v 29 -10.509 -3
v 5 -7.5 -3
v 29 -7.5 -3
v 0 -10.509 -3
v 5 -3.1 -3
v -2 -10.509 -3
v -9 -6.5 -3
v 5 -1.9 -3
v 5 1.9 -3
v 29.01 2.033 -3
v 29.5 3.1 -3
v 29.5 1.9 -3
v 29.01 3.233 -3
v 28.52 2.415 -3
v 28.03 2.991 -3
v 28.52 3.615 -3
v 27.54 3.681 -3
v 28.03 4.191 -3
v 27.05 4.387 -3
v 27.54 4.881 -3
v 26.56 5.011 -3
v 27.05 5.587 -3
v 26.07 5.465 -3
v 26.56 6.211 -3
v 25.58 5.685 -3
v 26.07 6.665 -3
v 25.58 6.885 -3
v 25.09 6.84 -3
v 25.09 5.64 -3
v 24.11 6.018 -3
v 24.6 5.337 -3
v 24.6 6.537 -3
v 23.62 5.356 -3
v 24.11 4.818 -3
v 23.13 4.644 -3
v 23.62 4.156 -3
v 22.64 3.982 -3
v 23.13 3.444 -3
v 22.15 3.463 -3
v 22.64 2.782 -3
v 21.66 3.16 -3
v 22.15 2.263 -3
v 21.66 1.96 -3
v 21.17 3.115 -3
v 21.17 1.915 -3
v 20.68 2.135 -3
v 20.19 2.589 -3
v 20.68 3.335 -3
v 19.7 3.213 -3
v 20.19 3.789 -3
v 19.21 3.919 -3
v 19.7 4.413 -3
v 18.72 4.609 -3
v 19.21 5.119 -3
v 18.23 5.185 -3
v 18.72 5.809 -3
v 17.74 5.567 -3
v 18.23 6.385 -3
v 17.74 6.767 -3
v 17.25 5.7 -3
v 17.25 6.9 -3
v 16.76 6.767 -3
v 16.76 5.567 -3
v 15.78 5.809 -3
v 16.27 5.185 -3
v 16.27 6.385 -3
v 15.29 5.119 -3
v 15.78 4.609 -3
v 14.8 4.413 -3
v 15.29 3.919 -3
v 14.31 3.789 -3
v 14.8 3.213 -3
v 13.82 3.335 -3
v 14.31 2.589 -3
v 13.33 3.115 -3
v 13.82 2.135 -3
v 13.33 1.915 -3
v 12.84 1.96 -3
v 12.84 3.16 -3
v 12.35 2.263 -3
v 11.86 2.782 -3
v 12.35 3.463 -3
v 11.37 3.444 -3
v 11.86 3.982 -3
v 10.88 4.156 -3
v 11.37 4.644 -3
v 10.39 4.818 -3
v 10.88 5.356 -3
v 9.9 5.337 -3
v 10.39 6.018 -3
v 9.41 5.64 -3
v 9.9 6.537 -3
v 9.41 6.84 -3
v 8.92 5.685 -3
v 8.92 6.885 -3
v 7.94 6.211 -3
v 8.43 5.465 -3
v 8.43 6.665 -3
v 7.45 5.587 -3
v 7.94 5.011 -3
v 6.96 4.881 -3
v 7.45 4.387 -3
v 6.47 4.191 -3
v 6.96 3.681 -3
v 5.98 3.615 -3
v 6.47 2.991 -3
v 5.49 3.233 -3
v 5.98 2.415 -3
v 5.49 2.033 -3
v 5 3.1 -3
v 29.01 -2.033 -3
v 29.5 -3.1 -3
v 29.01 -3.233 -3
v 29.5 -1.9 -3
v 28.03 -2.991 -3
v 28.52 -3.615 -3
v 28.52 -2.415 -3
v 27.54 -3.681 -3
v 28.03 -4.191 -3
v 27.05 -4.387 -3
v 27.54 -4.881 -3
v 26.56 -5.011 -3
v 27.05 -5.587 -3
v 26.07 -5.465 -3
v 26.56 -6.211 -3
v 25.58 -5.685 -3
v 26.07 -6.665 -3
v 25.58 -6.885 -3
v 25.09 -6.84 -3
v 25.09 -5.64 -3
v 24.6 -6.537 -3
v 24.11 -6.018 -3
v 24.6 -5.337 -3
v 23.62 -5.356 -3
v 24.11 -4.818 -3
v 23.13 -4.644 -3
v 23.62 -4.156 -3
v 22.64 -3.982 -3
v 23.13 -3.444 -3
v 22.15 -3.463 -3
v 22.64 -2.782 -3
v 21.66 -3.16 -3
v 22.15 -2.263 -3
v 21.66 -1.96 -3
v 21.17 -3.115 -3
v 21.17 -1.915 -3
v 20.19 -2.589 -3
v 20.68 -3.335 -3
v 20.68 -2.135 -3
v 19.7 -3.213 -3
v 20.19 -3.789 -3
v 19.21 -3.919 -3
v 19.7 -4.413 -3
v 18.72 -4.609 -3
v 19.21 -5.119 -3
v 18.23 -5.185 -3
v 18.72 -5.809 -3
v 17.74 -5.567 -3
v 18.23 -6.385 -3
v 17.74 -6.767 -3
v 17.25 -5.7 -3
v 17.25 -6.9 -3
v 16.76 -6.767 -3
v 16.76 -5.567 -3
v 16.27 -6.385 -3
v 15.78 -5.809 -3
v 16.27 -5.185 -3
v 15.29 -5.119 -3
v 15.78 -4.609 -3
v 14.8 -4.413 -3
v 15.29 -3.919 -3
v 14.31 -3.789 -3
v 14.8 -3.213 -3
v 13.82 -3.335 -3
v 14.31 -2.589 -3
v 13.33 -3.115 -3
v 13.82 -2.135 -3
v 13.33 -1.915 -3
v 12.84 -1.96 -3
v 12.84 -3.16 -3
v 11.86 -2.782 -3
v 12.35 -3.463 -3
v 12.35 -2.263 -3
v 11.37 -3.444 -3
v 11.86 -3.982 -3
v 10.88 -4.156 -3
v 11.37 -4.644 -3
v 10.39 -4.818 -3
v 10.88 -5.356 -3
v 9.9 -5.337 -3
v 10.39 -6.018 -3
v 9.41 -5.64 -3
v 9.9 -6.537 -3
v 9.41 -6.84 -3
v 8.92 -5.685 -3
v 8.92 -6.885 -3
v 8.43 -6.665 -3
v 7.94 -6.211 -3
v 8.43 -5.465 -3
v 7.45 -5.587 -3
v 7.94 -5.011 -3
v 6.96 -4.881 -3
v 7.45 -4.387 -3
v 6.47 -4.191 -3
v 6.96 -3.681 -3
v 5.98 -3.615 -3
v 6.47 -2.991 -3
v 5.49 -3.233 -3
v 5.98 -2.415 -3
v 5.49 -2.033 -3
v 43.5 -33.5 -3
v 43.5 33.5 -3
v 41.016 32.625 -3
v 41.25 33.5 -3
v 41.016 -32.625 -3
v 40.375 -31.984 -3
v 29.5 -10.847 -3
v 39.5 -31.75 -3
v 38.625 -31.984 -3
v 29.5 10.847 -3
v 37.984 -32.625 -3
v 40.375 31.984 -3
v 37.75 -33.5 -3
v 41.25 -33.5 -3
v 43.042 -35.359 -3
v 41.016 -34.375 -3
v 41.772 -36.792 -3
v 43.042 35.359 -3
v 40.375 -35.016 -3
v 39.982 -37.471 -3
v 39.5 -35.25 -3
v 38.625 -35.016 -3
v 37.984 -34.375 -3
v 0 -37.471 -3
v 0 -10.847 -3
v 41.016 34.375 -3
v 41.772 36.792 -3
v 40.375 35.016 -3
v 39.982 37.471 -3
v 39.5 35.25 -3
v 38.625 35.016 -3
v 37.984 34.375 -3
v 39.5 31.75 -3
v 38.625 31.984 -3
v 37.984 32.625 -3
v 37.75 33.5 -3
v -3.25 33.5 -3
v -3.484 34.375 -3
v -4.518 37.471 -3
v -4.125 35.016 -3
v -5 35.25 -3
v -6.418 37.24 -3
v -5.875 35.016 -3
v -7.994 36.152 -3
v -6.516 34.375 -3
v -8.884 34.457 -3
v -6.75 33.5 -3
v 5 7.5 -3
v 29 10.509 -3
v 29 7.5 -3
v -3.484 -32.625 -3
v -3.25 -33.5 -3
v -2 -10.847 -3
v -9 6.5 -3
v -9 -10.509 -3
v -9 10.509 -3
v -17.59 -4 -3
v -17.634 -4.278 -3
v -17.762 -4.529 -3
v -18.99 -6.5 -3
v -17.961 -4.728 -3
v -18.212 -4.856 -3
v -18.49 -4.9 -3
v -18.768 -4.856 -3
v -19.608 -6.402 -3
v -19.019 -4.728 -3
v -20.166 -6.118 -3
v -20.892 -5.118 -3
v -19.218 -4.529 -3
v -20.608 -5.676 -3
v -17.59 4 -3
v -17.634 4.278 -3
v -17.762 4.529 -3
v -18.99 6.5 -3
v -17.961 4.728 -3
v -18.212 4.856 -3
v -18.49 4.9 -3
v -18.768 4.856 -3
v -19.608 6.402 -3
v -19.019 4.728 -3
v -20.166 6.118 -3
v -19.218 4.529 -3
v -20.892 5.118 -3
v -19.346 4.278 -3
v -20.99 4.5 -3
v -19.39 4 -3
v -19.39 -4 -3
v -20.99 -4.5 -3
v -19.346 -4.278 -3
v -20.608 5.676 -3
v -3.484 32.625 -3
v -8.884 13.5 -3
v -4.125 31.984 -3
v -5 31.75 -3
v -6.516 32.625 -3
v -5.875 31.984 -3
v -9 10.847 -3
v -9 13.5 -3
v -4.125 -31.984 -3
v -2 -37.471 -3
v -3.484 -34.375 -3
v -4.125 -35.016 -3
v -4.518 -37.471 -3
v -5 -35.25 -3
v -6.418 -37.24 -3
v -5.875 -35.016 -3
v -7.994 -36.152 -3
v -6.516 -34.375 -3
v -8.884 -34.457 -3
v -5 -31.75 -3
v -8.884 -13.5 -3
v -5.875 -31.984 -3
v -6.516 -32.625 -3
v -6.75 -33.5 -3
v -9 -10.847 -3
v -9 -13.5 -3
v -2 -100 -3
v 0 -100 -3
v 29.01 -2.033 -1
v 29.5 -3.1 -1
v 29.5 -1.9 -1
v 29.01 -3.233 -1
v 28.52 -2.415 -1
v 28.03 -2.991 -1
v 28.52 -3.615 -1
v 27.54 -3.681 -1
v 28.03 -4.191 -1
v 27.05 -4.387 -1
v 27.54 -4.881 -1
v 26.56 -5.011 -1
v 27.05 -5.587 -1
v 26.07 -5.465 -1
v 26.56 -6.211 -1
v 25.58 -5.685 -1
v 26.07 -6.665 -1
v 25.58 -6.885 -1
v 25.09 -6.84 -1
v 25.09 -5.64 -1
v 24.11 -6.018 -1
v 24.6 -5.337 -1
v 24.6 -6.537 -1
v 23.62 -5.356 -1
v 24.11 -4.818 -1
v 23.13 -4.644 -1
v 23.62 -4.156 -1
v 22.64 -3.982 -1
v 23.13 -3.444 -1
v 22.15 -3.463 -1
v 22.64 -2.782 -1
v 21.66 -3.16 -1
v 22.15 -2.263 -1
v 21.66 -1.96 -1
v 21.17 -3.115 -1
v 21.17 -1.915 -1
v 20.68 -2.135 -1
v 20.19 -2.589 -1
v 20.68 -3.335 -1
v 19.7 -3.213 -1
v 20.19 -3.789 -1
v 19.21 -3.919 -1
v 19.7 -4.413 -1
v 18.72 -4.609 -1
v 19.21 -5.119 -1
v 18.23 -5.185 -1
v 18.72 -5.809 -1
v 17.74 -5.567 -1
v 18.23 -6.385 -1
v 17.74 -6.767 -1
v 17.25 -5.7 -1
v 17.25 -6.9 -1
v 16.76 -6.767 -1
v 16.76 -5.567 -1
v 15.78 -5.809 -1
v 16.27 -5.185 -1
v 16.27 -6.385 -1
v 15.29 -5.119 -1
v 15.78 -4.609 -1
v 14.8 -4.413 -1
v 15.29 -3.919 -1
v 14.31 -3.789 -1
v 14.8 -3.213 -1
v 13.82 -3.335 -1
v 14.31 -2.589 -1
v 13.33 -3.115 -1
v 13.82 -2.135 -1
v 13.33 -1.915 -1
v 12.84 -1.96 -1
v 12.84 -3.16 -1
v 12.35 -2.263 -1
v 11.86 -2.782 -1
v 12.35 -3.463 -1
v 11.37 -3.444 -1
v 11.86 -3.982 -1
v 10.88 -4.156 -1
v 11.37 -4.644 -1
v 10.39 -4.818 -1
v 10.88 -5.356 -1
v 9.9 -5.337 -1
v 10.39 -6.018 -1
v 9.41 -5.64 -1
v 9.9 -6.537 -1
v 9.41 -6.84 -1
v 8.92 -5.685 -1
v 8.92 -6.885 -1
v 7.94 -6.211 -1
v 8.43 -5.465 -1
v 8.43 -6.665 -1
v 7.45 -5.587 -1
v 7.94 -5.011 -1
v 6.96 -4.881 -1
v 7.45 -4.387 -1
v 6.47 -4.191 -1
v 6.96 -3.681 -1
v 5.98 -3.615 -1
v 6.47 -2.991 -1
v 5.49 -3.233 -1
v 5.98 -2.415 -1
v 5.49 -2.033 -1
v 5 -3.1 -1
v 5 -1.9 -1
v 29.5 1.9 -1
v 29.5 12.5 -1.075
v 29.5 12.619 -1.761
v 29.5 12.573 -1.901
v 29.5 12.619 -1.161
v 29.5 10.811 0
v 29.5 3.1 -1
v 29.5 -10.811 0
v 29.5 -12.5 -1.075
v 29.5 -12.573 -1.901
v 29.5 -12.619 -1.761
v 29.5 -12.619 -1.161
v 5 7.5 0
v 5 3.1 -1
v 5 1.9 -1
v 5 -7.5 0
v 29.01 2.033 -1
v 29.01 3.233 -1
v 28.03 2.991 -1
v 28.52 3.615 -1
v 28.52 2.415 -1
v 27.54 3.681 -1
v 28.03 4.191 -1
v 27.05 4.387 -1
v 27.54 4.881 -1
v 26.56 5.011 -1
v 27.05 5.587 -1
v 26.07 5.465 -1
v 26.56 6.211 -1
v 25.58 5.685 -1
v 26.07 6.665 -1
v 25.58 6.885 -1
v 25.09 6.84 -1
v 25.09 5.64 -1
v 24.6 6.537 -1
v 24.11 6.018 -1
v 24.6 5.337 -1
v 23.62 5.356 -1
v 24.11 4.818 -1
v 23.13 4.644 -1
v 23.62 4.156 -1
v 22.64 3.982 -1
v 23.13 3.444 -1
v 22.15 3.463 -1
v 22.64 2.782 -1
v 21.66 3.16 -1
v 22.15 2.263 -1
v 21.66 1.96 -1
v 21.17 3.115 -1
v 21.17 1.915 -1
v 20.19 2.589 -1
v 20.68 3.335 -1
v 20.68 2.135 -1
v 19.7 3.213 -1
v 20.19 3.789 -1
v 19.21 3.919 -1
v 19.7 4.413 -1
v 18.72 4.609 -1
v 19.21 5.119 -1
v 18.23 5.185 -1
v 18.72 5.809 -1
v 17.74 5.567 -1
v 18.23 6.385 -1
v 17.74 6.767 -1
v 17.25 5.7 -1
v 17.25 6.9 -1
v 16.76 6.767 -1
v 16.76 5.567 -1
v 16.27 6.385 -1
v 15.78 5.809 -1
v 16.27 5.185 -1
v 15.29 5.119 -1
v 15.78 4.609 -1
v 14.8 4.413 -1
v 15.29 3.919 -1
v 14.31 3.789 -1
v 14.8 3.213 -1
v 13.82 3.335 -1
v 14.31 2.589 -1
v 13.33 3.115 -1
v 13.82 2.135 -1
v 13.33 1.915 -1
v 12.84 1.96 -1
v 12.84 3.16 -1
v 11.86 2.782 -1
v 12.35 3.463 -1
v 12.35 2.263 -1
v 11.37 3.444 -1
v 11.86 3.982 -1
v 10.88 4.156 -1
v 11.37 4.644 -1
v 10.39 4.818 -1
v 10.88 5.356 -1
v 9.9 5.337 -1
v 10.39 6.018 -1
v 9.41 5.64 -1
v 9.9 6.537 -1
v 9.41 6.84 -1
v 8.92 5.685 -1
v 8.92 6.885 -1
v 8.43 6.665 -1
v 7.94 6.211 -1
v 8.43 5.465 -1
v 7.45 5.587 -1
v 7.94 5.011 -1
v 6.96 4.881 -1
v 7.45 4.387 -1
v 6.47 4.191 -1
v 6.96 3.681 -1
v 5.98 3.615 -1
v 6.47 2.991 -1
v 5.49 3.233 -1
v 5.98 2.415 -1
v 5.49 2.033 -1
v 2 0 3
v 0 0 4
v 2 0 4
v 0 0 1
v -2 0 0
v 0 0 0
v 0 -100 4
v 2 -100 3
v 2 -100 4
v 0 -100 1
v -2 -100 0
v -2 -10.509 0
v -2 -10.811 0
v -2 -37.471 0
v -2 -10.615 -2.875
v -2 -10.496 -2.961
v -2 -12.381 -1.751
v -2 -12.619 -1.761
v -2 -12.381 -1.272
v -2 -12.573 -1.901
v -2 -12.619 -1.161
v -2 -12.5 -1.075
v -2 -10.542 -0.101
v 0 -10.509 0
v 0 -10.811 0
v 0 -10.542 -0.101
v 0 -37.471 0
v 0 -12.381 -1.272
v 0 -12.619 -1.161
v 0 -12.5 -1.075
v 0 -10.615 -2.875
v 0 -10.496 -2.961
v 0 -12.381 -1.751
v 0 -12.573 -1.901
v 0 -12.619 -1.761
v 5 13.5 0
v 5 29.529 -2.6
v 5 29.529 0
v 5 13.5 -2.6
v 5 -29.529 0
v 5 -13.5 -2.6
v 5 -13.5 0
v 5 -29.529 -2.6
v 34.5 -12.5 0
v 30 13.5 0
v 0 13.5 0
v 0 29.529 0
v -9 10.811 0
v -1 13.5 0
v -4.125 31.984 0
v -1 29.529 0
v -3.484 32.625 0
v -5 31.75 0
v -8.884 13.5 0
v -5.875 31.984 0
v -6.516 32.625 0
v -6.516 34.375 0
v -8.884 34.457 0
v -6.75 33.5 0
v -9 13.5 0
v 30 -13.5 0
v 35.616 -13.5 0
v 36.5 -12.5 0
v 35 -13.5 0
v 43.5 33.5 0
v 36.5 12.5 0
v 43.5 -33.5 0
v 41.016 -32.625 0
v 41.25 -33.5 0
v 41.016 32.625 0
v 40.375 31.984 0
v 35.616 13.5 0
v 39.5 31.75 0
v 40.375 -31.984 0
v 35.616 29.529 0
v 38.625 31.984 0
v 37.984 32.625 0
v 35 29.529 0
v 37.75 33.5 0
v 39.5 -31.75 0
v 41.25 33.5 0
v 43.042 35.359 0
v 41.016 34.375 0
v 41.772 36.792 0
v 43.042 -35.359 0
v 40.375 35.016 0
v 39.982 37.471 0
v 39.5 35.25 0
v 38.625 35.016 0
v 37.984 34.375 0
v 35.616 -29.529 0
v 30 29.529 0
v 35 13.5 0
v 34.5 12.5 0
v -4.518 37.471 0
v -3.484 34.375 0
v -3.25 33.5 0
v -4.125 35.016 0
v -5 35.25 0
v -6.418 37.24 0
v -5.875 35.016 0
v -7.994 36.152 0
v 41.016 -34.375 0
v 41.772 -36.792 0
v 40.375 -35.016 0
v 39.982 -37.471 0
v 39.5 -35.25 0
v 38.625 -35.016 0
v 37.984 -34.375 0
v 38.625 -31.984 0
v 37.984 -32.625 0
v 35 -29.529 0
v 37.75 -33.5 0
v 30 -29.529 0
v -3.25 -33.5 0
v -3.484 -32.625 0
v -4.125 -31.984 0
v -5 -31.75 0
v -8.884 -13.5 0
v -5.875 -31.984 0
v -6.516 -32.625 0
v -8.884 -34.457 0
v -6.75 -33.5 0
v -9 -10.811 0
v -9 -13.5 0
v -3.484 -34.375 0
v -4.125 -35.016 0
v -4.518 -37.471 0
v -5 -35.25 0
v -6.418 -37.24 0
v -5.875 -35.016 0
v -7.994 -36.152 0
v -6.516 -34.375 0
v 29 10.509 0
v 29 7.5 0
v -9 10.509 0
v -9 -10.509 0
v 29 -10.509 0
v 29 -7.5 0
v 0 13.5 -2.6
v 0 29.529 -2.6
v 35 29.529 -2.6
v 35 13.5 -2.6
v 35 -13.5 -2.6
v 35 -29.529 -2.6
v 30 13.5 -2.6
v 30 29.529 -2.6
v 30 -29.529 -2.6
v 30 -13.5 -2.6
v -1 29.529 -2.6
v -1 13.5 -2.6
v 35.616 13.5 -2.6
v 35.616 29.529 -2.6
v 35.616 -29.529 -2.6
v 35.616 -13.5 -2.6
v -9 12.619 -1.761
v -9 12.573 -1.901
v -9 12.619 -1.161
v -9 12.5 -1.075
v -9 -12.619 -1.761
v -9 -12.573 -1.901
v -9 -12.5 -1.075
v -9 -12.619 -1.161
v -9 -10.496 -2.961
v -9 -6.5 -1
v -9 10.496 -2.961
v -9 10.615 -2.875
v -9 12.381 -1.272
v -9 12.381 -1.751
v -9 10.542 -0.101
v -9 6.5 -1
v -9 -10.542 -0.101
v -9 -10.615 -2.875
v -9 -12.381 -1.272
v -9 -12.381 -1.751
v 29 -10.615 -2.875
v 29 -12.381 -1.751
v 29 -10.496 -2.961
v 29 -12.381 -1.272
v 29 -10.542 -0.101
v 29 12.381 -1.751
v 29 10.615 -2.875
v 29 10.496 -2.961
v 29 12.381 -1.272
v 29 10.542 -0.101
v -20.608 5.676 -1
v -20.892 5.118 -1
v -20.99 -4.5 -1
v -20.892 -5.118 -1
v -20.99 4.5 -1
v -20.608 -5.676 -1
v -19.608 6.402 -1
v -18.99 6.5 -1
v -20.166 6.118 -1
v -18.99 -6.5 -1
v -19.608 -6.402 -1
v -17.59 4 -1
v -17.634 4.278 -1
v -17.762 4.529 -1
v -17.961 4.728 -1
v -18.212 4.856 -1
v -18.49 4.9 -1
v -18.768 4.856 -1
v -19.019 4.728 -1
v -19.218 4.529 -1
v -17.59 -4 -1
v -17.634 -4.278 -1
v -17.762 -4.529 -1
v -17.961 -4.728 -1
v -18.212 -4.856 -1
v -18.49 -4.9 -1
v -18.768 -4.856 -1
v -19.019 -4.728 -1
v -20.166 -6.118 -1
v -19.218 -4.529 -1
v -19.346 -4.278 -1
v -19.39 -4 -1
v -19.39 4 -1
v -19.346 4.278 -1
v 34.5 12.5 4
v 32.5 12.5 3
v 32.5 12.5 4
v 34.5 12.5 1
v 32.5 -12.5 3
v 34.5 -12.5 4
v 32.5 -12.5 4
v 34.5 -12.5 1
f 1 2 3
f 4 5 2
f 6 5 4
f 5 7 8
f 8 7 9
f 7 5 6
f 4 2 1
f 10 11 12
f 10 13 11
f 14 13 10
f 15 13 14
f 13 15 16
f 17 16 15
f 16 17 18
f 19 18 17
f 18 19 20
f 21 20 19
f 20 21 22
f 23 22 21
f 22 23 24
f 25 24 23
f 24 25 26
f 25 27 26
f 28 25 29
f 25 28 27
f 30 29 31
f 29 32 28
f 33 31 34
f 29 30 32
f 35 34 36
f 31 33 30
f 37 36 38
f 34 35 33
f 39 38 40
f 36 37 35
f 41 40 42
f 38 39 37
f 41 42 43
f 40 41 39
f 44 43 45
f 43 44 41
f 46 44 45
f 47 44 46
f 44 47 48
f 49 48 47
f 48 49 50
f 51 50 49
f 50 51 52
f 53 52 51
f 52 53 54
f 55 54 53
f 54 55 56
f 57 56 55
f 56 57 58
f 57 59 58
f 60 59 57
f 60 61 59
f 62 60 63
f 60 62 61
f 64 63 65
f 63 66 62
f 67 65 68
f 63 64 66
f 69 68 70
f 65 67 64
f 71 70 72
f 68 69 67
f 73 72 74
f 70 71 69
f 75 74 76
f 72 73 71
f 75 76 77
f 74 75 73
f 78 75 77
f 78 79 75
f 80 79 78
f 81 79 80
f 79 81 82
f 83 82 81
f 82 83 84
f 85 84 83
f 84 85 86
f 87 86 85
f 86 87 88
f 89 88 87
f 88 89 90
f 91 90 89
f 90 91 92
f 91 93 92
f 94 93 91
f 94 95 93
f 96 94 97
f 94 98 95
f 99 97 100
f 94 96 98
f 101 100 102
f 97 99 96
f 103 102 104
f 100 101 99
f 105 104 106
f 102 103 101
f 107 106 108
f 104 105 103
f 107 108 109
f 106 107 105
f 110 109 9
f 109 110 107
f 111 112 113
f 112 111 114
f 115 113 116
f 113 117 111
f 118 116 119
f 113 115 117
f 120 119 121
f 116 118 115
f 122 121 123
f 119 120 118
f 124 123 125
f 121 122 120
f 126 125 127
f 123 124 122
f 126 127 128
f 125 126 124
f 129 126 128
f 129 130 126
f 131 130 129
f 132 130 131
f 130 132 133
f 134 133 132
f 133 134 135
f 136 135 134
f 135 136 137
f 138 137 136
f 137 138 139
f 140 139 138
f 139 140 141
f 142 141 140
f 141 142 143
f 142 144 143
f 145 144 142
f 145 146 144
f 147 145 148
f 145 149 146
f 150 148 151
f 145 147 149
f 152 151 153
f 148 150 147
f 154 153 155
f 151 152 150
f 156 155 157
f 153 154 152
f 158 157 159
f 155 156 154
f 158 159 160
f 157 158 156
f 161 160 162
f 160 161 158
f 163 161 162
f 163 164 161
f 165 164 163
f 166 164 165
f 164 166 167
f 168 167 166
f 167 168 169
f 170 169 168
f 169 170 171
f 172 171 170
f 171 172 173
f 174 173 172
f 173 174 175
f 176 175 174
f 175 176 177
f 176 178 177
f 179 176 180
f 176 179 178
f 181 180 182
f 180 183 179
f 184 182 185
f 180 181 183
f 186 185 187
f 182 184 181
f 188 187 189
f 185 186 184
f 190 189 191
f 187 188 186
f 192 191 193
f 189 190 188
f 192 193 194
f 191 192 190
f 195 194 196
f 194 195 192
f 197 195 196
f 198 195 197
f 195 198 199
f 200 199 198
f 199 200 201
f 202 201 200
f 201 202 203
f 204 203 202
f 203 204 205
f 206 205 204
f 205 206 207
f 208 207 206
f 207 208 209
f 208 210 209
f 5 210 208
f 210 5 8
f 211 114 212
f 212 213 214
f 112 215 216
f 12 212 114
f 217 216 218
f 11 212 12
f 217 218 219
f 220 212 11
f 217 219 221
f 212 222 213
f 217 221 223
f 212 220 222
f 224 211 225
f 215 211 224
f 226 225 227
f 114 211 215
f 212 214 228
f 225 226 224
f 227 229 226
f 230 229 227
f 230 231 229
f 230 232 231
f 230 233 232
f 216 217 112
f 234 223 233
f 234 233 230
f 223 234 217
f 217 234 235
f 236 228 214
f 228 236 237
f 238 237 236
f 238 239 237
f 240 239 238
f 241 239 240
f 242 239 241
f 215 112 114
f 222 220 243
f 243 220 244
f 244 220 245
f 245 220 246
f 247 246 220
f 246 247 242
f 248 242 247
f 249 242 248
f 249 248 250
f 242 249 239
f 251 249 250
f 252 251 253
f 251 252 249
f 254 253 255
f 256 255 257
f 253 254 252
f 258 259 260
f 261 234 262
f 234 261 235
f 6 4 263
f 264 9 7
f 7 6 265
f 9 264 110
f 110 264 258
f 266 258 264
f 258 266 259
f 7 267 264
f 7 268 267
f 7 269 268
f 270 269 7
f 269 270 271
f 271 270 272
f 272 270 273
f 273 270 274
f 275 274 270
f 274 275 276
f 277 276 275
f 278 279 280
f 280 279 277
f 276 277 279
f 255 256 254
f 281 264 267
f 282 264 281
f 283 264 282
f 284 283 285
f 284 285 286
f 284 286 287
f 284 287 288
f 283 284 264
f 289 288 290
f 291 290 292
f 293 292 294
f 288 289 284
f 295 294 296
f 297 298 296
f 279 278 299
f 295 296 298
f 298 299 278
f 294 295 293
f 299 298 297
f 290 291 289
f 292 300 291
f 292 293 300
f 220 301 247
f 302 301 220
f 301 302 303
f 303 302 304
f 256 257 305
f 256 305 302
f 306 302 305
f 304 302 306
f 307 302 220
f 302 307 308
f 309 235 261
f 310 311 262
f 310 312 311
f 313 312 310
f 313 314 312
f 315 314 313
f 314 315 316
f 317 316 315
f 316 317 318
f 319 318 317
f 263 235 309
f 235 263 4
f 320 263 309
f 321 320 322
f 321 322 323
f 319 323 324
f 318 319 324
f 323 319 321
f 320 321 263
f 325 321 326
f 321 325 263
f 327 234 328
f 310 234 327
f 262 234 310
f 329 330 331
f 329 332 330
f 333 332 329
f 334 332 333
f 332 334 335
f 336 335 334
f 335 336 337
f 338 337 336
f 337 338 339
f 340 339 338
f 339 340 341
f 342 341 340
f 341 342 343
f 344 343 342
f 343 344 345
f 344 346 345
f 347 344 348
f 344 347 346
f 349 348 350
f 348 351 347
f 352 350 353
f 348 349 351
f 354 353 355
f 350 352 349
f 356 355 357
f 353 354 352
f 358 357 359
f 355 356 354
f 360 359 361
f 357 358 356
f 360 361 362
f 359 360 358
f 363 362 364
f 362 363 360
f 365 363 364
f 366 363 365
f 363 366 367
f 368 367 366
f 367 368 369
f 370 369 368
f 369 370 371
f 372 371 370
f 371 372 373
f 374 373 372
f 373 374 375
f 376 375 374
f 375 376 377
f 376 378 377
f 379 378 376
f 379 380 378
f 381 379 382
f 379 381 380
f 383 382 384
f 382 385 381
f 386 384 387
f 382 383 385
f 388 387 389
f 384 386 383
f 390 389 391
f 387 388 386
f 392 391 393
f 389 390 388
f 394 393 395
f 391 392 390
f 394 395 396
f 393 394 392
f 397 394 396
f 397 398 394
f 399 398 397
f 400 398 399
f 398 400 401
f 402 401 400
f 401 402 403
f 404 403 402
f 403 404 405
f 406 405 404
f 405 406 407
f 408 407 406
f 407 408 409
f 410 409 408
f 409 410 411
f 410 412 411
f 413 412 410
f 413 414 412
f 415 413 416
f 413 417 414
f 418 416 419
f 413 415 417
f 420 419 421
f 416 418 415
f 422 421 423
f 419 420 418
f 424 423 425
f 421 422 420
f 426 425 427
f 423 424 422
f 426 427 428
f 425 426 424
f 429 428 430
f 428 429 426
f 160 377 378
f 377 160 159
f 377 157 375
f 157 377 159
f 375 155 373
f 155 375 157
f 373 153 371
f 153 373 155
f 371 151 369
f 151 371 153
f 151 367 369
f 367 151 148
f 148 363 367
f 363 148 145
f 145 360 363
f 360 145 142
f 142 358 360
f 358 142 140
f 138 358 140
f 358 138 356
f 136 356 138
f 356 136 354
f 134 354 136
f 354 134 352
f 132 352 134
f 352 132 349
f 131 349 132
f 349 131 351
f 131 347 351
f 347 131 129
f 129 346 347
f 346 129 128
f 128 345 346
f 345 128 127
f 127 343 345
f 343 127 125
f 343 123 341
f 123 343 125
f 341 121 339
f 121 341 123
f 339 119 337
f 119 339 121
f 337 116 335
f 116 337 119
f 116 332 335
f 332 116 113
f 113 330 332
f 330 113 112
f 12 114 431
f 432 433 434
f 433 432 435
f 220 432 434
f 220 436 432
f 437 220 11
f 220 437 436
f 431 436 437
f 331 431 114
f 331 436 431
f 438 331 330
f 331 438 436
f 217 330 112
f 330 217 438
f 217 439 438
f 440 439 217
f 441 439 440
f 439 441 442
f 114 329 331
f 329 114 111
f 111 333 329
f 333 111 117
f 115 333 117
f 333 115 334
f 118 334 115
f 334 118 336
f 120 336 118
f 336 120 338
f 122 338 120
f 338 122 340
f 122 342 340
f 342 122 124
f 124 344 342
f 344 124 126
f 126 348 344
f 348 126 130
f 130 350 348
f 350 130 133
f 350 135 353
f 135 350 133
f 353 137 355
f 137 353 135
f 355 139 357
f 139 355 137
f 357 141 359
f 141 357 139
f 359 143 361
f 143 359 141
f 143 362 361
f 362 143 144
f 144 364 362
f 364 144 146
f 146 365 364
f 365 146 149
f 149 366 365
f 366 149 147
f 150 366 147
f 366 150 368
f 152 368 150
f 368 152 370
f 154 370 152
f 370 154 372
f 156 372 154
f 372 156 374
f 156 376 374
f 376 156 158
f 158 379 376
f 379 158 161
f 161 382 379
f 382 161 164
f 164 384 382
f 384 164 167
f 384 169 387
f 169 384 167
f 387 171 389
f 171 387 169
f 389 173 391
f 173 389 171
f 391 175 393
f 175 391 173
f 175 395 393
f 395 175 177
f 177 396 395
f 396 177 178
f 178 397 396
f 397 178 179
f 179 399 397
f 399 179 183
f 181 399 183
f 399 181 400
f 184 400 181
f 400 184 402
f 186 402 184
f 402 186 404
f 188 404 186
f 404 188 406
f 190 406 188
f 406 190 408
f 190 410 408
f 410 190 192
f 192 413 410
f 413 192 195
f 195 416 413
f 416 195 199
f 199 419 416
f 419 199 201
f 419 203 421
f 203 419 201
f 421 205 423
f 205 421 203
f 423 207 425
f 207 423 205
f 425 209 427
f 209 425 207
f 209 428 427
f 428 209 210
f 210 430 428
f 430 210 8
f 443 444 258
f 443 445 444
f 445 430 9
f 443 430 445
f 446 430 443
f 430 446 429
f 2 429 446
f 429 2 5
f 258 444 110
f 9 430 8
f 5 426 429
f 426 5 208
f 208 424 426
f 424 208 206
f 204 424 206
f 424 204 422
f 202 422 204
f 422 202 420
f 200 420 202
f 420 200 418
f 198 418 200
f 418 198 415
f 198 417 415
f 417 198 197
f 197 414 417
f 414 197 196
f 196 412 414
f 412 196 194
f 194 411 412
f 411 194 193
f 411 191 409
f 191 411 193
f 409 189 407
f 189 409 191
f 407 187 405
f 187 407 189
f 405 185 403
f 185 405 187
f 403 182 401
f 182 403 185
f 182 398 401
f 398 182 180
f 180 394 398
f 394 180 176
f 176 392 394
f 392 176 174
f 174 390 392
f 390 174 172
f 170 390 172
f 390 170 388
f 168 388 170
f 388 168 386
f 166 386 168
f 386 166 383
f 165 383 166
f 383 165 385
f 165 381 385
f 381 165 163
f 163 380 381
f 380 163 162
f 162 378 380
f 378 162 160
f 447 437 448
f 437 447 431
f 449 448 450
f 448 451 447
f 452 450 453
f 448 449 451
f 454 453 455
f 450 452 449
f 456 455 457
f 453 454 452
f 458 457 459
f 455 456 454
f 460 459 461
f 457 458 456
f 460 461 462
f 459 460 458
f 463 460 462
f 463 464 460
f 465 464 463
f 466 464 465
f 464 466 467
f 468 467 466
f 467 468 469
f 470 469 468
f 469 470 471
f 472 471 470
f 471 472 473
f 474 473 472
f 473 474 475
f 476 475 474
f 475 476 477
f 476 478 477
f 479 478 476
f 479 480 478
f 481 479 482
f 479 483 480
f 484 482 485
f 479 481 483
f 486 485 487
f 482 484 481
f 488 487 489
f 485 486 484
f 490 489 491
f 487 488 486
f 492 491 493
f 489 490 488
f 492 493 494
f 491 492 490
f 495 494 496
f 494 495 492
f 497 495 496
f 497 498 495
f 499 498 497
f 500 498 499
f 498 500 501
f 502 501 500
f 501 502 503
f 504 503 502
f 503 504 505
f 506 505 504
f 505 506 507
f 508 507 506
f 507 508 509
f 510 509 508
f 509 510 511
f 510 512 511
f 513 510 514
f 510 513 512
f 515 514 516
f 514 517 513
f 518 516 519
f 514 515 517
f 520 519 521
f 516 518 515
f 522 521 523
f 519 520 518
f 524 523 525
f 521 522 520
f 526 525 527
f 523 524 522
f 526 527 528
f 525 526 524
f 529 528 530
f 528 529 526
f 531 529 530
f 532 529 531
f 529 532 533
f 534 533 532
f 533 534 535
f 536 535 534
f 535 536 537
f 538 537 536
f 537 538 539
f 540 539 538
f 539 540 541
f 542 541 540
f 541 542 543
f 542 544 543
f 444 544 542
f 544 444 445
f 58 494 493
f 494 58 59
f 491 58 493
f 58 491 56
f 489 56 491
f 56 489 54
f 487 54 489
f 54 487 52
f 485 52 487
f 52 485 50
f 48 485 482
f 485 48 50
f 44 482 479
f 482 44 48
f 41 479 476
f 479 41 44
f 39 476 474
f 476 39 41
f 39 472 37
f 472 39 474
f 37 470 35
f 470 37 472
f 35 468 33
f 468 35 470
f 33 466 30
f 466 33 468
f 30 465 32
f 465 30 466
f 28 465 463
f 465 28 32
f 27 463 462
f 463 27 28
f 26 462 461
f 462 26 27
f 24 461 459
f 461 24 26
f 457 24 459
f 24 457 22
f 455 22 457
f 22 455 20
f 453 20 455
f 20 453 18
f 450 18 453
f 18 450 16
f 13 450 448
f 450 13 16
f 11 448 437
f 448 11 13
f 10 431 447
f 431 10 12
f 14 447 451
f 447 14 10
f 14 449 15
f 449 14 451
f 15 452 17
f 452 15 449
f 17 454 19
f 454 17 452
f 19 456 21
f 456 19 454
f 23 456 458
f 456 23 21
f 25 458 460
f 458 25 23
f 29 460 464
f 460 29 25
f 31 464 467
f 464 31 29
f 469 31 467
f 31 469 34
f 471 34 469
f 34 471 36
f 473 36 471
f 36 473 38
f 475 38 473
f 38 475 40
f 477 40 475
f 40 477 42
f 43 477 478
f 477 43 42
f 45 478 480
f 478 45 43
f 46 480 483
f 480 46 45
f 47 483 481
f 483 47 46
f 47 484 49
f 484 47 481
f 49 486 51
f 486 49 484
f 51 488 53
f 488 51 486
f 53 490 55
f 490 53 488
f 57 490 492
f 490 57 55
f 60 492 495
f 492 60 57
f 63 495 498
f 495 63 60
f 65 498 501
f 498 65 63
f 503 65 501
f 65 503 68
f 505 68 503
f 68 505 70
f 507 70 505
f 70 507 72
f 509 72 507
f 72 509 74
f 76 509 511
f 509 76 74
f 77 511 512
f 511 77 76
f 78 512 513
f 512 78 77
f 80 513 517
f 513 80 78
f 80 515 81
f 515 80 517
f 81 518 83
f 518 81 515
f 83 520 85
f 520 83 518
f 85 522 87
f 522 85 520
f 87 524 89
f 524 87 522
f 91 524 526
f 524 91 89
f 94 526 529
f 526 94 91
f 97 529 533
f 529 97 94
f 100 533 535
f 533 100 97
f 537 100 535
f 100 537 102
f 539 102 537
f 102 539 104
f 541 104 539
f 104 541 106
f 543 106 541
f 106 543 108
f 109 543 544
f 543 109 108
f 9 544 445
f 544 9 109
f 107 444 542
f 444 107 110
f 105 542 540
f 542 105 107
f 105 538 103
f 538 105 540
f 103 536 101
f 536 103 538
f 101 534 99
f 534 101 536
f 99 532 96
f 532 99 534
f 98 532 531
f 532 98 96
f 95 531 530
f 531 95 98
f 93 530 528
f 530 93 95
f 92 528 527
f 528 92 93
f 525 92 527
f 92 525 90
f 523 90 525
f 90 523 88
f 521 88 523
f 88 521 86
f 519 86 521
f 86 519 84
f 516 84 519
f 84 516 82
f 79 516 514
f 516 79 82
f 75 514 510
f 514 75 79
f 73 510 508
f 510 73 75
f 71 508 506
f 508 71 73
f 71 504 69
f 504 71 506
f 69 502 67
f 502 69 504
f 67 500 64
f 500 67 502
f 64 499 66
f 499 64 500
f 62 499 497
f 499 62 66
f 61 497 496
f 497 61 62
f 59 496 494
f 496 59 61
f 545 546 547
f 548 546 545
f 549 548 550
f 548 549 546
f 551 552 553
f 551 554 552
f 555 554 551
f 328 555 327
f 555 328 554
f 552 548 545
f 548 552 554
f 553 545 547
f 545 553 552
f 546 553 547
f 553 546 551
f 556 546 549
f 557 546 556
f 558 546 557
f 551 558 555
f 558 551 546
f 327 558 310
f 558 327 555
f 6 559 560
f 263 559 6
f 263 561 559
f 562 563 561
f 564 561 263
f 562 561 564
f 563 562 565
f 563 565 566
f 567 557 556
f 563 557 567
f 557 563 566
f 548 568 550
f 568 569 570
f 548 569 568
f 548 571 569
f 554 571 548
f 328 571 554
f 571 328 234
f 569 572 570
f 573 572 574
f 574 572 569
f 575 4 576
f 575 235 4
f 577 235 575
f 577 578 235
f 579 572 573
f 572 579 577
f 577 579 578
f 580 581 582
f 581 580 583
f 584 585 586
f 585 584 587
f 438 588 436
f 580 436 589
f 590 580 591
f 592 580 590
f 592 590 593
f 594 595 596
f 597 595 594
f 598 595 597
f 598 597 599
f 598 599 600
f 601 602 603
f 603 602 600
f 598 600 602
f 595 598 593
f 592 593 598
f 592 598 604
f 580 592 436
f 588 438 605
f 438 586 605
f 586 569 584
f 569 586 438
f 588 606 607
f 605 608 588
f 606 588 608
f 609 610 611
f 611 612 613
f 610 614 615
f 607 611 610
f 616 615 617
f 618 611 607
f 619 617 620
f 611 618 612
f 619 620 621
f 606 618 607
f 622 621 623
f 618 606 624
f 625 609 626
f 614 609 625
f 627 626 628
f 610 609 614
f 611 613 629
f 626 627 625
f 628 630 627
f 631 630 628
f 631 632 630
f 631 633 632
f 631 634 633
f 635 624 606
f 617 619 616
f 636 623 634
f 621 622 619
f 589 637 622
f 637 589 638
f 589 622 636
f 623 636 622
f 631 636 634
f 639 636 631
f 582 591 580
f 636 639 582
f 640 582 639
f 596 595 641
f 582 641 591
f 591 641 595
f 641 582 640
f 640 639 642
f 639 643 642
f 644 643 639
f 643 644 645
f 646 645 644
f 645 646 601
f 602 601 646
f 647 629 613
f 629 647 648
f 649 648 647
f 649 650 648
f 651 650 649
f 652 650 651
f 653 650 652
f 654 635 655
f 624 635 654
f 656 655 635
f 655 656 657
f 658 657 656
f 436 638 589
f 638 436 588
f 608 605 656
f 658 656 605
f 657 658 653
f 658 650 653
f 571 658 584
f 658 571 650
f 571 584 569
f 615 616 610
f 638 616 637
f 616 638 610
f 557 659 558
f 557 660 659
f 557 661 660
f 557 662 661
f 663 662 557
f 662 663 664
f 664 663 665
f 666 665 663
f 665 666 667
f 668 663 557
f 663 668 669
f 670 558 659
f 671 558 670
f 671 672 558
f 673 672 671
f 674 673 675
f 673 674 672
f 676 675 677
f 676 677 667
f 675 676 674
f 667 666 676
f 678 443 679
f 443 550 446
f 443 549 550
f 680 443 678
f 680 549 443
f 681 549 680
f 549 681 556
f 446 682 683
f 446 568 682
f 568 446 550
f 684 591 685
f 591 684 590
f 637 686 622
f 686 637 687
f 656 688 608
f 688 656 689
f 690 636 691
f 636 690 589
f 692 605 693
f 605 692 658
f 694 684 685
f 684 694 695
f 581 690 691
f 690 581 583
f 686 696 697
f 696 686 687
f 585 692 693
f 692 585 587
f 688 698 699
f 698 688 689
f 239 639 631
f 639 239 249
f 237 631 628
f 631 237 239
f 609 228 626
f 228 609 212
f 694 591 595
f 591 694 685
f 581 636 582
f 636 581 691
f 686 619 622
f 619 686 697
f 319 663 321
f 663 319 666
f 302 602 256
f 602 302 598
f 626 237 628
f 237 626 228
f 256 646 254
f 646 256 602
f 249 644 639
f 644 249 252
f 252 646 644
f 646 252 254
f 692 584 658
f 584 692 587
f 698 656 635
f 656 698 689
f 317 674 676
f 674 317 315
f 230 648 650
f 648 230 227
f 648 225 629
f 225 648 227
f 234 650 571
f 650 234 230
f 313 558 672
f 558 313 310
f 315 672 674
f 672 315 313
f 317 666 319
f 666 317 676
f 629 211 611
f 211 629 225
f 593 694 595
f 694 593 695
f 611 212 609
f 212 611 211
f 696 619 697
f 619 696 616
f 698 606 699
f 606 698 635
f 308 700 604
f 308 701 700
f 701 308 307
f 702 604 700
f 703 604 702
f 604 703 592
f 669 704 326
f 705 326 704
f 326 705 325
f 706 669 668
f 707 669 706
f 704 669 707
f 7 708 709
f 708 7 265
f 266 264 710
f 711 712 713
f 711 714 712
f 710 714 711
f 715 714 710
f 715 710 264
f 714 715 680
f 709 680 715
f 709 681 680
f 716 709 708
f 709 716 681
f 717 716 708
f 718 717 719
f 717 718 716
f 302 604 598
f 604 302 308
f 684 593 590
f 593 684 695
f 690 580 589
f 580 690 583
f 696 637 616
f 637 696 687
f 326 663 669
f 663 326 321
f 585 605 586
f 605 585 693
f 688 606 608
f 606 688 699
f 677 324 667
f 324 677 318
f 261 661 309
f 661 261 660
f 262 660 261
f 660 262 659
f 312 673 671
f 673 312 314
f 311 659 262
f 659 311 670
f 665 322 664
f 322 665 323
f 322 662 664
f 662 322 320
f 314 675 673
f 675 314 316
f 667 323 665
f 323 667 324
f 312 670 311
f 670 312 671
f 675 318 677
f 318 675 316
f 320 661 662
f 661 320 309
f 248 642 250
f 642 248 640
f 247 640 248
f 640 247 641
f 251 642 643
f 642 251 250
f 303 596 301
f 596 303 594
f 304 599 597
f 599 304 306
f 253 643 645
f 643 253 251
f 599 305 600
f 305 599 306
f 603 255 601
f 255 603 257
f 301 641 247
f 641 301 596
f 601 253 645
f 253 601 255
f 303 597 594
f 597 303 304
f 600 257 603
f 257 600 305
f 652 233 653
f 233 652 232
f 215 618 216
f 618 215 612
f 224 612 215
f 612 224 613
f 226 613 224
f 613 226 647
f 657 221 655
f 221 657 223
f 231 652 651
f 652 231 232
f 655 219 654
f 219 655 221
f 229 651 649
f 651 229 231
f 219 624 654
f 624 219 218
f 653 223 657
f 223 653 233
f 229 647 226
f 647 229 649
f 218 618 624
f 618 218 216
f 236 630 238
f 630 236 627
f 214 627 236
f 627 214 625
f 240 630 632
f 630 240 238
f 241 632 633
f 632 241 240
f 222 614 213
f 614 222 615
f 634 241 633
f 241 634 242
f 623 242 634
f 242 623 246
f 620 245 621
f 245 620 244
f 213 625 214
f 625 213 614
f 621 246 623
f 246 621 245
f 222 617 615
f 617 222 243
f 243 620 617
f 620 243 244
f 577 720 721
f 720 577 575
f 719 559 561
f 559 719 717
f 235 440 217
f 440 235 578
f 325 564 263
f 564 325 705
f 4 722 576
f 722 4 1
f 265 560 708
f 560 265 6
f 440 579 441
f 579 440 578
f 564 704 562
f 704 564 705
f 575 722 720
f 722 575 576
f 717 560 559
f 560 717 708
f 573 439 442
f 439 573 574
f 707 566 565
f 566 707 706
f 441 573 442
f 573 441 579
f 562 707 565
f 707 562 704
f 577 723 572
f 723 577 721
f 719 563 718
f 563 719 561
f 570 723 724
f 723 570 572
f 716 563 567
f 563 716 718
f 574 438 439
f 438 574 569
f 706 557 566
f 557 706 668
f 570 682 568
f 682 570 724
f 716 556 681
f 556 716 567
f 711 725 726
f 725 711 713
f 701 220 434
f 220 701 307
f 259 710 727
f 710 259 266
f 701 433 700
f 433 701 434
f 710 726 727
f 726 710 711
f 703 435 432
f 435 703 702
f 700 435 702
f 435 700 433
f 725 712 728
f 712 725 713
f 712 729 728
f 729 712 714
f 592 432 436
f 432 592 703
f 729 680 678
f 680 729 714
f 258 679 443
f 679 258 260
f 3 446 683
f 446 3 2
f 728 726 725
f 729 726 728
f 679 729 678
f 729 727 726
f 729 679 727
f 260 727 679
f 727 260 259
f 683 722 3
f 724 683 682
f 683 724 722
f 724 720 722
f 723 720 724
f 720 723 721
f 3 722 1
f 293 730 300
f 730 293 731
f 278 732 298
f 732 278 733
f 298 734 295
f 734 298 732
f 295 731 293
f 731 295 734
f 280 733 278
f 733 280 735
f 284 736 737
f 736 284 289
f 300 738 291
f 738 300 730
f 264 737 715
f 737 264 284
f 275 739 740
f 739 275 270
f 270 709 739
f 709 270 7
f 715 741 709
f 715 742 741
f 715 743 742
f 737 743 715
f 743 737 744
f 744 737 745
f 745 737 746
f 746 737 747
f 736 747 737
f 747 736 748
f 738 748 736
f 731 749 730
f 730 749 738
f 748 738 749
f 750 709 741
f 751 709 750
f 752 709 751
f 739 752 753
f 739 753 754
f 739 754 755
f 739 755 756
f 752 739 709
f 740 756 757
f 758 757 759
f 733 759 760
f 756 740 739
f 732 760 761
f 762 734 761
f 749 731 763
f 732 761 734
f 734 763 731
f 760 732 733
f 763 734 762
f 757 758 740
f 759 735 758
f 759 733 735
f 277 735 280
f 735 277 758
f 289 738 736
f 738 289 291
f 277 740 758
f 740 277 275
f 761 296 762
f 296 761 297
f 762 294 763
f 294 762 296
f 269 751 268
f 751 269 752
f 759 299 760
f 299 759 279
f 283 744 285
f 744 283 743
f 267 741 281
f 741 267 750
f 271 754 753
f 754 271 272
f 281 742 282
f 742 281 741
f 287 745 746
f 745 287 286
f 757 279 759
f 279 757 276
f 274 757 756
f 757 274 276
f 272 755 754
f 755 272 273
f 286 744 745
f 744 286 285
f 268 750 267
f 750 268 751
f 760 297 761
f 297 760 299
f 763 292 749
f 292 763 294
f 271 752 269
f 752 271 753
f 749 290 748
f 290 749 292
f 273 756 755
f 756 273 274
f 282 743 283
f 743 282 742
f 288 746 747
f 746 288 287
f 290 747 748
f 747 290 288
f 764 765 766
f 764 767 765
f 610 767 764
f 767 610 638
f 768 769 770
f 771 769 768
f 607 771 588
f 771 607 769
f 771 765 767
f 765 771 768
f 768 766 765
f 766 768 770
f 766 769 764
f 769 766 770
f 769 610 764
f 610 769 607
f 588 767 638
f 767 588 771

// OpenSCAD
// -*- mode: scad; c-basic-offset: 2; indent-tabs-mode: nil; -*-
e=0.01;

with_frame=true;             // The mounting frame
with_isolation=true;         // isolation layer in frame
with_spring_cover=false;     // covering the spring with cover (needs bridging)
with_whole_width_rest=true;  // rest on din-rail for whole length.

// Size of the hole-pattern for mounting.
screw_along  = 67;
screw_across = 44.5;
lug_len=10;            // Length of the lug used pull down to remove from rail

screw_bar=8;           // Width of the outer frame bar with screw holes
screw_dia=3.5;

din_wide=35;
din_dist=din_wide - 0.5; // Slightly smaller for more clamping action.
din_sheet=1;           // thickness of the din-rail metal

bottom_thick=3;       // Thickness of whole underside frame
isolation_thick=0.4;  // Thickness of isolation bottom.

spring_height=2;      // Needs to be < bottom_thick if with_spring_cover
spring_thick=1.2;

rest_shelf=5;         // The width of the area resting on the rail itself.
hold_wide=25;         // The width of the top 'hook' holding on the rail.
latch_wide=15;        // The width of the moveable clip at the bottom of rail.
slide_gap=0.25;       // In-place printed gap for clip to move.

plate_x = screw_across + screw_bar;
plate_y = hold_wide + 2;

module hook_polygon(do_slide=false) {
  w=1;
  h=do_slide ? 0.8 : 2;
  ledge=1;
  hd=sqrt(2) * h;
  // TODO: doing both hook types in one do_slide-configured array is not
  // very readable and should be broken up into two.
  polygon([[-2*w, -bottom_thick], [0, -bottom_thick], [0, din_sheet],
           [h, h + din_sheet], [h, h + ledge + din_sheet],
           if (do_slide) [-1, h + ledge + din_sheet+3],
           if (do_slide) [-2, h + ledge + din_sheet+3],
           if (do_slide) [-3, 0],
           if (!do_slide) [0, h + ledge + din_sheet],
           [-2*w, 0],
           ]);
}

module hook(len=15, do_slide=false) {
  translate([0, len/2, 0]) rotate([90, 0, 0])
    linear_extrude(height=len) hook_polygon(do_slide);
}

module spring_polygon(len=20, wide=15, thick=1) {
  p=3;  // periods
  n=50;
  actual_w=wide/2 - thick/2;
  points = [
    for (i = [0:n]) [ len*i/n, actual_w*cos(i * p * 360 / n) + thick/2],
    for (i = [0:n]) [ len*(n-i)/n, actual_w*cos((n-i) * p * 360 / n) - thick/2],
  ];

  translate([0, -actual_w, 0]) polygon(points);
}

module spring(len=20, wide=15, thick=1, height=1) {
  linear_extrude(height=height) spring_polygon(len, wide, thick);
}

module spring_symmetric(len=20, wide=15, delta=5, thick=1, height=1) {
  half_w=wide/2-delta/2;
  translate([0, -delta/2, -bottom_thick]) spring(len, half_w, thick, height);
  scale([1, -1, 1]) translate([0, -delta/2, -bottom_thick])
    spring(len, half_w, thick, height);
}

module bottom_plate() {
  w = screw_along;
  h = screw_across;

  difference() {
    translate([din_dist/2, 0, -bottom_thick/2]) {
      cube([plate_x, plate_y, bottom_thick], center=true);

      if (with_frame) {
        if (with_isolation) {
          translate([-h/2, -w/2, -bottom_thick/2]) cube([h, w, isolation_thick]);
        }

        if (with_whole_width_rest) {
          translate([-din_dist/2, -w/2, -bottom_thick/2])
            cube([rest_shelf, w, bottom_thick]);
          translate([-din_dist/2 + din_wide - rest_shelf, -w/2, -bottom_thick/2])
            cube([rest_shelf, w, bottom_thick]);
        }

        // frame around. hull() joined cylinders making nice rounded corners.
        hull() {
          translate([h/2, w/2, -bottom_thick/2]) cylinder(r=screw_bar/2, h=bottom_thick);
          translate([-h/2, w/2, -bottom_thick/2]) cylinder(r=screw_bar/2, h=bottom_thick);
        }
        hull() {
          translate([h/2, -w/2, -bottom_thick/2]) cylinder(r=screw_bar/2, h=bottom_thick);
          translate([-h/2, -w/2, -bottom_thick/2]) cylinder(r=screw_bar/2, h=bottom_thick);
        }
        hull() {
          translate([-h/2, w/2, -bottom_thick/2]) cylinder(r=screw_bar/2, h=bottom_thick);
          translate([-h/2, -w/2, -bottom_thick/2]) cylinder(r=screw_bar/2, h=bottom_thick);
        }
        hull() {
          translate([h/2, w/2, -bottom_thick/2]) cylinder(r=screw_bar/2, h=bottom_thick);
          translate([h/2, -w/2, -bottom_thick/2]) cylinder(r=screw_bar/2, h=bottom_thick);
        }
      }
    }

    for (dx = [-1, 1]) {
      for (dy = [-1, 1]) {
        translate([din_dist/2+dx*h/2, dy*w/2, -bottom_thick-e]) cylinder(r=screw_dia/2, h=bottom_thick+2*e, $fn=12);
      }
    }
  }
}

module spring_latch() {
  hook(len=latch_wide, true);

  translate([rest_shelf, 0, 0]) spring_symmetric(len=din_dist - 2*rest_shelf,
                                                 thick=spring_thick,
                                                 wide=latch_wide,
                                                 delta=5, height=spring_height);
}

module dovetail(h=2, gap=slide_gap, len=20) {
  c=h/10;  // center
  out=h/1.5;
  hull() {
    translate([-h/2, -gap/2+e, 0]) cylinder(r=gap/2, h=len);
    translate([-c, -out, 0]) cylinder(r=gap/2, h=len);
  }
  hull() {
    translate([-c, -out, 0]) cylinder(r=gap/2, h=len);
    translate([+c, -out, 0]) cylinder(r=gap/2, h=len);
  }
  hull() {
    translate([+c, -out, 0]) cylinder(r=gap/2, h=len);
    translate([+h/2, -gap/2+e, 0]) cylinder(r=gap/2, h=len);
  }
}

module one_slide(len=2, slide_wide=(plate_y-latch_wide)/4) {
  translate([din_dist-rest_shelf, -latch_wide/2-slide_wide, -bottom_thick/2])
    rotate([0, -90, 0]) dovetail(h=bottom_thick, len=len);
}

module spring_punch(skin=with_spring_cover ? isolation_thick : 0) {
  color("yellow") translate([rest_shelf, -latch_wide/2, -bottom_thick-e-skin])
    cube([din_dist-2*rest_shelf, latch_wide, bottom_thick+2*e]);
}

module punch() {
  spring_punch();  // Space for the spring.
  hull() {
    one_slide(len=0.5);
    scale([1, -1, 1]) one_slide(len=0.5);
  }
  one_slide(len=60);
  scale([1, -1, 1]) one_slide(len=60);
}

module open_pull_lug(h=2) {
  r=2;
  wide=6.5;  // half-wide. Good enough for pocket knife blade.
  translate([e, 0, -bottom_thick])
    difference() {
    hull() {
      translate([-lug_len, -wide, 0]) cube([lug_len, 2*wide, h]);
      translate([-lug_len, -wide+r, 0]) cylinder(r=r, h=h, $fn=20);
      translate([-lug_len, +wide-r, 0]) cylinder(r=r, h=h, $fn=20);
    }
    translate([0, 0, -e]) hull() {
      translate([-lug_len+0.5, -wide+0.5+r, 0]) cylinder(r=1.8/2, h=h+2*e, $fn=20);
      translate([-lug_len+0.5, +wide-0.5-r, 0]) cylinder(r=1.8/2, h=h+2*e, $fn=20);
    }
  }
}


// Hooks
translate([din_dist, 0, 0]) scale([-1, 1, 1]) hook(len=hold_wide);  // hold hook
spring_latch();  // latching hook

// Place to mount PCB etc.
difference() {
  bottom_plate();
  punch();
}

// Make simple to open.
translate([-(plate_x - din_dist)/2, 0, 0]) open_pull_lug();
